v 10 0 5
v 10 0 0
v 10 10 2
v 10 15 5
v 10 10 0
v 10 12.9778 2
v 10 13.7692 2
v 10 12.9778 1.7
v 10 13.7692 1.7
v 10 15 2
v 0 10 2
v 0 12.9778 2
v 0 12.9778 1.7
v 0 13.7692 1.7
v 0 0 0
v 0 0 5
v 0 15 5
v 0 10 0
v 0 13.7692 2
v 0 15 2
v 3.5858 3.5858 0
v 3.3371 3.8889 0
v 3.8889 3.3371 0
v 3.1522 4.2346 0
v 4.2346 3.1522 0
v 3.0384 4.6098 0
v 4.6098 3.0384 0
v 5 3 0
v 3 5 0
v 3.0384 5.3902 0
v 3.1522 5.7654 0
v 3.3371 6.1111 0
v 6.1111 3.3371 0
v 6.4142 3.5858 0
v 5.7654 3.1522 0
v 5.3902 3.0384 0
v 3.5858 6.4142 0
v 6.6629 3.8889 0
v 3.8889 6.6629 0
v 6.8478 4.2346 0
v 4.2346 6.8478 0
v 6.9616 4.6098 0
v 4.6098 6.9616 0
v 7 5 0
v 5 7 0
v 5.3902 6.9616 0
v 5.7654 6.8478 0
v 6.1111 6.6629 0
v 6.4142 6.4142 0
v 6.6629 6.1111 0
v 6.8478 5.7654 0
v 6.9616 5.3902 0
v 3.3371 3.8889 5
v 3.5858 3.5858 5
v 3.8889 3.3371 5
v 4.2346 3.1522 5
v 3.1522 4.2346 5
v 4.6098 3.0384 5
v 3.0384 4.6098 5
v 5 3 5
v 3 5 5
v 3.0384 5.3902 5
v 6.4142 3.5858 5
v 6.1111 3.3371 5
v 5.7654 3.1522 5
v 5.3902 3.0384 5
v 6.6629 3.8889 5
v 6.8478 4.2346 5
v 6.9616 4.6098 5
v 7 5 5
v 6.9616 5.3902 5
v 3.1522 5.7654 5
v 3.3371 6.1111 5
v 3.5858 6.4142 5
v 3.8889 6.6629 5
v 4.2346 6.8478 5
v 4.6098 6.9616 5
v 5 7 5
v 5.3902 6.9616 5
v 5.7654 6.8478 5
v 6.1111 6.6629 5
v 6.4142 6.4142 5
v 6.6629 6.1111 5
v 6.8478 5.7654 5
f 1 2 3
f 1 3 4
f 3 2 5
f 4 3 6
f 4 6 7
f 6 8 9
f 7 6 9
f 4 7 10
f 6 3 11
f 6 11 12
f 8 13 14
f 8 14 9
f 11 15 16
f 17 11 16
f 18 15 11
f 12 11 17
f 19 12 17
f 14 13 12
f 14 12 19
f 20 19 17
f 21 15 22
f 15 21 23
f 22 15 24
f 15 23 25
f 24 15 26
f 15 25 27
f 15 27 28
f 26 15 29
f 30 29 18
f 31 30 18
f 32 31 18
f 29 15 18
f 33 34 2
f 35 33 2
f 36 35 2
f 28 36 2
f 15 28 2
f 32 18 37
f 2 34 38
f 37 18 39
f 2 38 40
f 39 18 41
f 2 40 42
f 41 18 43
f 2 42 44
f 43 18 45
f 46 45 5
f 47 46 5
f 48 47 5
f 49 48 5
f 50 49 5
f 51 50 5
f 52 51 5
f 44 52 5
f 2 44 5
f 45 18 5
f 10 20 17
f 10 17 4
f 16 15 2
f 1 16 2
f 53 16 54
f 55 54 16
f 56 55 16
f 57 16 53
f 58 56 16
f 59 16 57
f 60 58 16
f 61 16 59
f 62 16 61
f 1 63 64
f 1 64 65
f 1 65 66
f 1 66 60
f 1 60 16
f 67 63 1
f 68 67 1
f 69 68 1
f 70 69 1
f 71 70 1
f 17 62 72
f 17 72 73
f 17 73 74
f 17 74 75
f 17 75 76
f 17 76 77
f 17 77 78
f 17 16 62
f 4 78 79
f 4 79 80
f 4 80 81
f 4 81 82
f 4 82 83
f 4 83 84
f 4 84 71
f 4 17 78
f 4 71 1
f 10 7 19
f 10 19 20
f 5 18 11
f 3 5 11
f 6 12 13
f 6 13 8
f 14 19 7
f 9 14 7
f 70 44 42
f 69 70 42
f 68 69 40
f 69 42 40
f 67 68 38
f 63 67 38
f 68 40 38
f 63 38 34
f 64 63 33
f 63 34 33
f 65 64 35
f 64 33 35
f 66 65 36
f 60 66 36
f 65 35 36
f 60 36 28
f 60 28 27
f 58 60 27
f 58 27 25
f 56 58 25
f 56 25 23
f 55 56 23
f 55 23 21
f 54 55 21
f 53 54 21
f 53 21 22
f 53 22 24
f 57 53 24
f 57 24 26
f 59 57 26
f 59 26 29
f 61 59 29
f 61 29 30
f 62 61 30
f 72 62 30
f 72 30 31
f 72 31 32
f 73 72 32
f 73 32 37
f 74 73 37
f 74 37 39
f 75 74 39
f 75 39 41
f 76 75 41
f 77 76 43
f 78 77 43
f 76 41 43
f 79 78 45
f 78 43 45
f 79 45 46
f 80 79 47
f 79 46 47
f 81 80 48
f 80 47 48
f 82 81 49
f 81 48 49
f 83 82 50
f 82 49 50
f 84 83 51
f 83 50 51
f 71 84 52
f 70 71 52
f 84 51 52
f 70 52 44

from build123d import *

# Parameters (mm, degrees)
F0_W     = 10
F0_H     = 15
F1_DEPTH = 5
F2_W     = 5
F2_H     = 2
F3_DEPTH = 25
F4_R     = 2
F5_DEPTH = 25
F6_W     = 10
F6_H     = 0.791458
F7_DEPTH = 0.3


with BuildPart() as f1:
    # F0 (on Top) → F1 (new body)
    with BuildSketch(Plane.XY):
        with Locations((5, 7.5)):
            Rectangle(F0_W, F0_H)
    extrude(amount=F1_DEPTH)

    # F2 (on face) → F3 (cut)
    with BuildSketch(Plane.YZ.offset(10)):
        with Locations((12.5, 1)):
            Rectangle(F2_W, F2_H)
    extrude(amount=-F3_DEPTH, mode=Mode.SUBTRACT)

    # F4 (on face) → F5 (cut)
    with BuildSketch(Plane(origin=(0, 0, 0), x_dir=(1, 0, 0), z_dir=(0, 0, -1))):
        with Locations((5, -5)):
            Circle(F4_R)
    extrude(amount=-F5_DEPTH, mode=Mode.SUBTRACT)

    # F6 (on face) → F7 (join)
    with BuildSketch(Plane(origin=(0, 0, 2), x_dir=(1, 0, 0), z_dir=(0, 0, -1))):
        with Locations((5, -13.373503)):
            Rectangle(F6_W, F6_H)
    extrude(amount=F7_DEPTH)


solid = f1.part
